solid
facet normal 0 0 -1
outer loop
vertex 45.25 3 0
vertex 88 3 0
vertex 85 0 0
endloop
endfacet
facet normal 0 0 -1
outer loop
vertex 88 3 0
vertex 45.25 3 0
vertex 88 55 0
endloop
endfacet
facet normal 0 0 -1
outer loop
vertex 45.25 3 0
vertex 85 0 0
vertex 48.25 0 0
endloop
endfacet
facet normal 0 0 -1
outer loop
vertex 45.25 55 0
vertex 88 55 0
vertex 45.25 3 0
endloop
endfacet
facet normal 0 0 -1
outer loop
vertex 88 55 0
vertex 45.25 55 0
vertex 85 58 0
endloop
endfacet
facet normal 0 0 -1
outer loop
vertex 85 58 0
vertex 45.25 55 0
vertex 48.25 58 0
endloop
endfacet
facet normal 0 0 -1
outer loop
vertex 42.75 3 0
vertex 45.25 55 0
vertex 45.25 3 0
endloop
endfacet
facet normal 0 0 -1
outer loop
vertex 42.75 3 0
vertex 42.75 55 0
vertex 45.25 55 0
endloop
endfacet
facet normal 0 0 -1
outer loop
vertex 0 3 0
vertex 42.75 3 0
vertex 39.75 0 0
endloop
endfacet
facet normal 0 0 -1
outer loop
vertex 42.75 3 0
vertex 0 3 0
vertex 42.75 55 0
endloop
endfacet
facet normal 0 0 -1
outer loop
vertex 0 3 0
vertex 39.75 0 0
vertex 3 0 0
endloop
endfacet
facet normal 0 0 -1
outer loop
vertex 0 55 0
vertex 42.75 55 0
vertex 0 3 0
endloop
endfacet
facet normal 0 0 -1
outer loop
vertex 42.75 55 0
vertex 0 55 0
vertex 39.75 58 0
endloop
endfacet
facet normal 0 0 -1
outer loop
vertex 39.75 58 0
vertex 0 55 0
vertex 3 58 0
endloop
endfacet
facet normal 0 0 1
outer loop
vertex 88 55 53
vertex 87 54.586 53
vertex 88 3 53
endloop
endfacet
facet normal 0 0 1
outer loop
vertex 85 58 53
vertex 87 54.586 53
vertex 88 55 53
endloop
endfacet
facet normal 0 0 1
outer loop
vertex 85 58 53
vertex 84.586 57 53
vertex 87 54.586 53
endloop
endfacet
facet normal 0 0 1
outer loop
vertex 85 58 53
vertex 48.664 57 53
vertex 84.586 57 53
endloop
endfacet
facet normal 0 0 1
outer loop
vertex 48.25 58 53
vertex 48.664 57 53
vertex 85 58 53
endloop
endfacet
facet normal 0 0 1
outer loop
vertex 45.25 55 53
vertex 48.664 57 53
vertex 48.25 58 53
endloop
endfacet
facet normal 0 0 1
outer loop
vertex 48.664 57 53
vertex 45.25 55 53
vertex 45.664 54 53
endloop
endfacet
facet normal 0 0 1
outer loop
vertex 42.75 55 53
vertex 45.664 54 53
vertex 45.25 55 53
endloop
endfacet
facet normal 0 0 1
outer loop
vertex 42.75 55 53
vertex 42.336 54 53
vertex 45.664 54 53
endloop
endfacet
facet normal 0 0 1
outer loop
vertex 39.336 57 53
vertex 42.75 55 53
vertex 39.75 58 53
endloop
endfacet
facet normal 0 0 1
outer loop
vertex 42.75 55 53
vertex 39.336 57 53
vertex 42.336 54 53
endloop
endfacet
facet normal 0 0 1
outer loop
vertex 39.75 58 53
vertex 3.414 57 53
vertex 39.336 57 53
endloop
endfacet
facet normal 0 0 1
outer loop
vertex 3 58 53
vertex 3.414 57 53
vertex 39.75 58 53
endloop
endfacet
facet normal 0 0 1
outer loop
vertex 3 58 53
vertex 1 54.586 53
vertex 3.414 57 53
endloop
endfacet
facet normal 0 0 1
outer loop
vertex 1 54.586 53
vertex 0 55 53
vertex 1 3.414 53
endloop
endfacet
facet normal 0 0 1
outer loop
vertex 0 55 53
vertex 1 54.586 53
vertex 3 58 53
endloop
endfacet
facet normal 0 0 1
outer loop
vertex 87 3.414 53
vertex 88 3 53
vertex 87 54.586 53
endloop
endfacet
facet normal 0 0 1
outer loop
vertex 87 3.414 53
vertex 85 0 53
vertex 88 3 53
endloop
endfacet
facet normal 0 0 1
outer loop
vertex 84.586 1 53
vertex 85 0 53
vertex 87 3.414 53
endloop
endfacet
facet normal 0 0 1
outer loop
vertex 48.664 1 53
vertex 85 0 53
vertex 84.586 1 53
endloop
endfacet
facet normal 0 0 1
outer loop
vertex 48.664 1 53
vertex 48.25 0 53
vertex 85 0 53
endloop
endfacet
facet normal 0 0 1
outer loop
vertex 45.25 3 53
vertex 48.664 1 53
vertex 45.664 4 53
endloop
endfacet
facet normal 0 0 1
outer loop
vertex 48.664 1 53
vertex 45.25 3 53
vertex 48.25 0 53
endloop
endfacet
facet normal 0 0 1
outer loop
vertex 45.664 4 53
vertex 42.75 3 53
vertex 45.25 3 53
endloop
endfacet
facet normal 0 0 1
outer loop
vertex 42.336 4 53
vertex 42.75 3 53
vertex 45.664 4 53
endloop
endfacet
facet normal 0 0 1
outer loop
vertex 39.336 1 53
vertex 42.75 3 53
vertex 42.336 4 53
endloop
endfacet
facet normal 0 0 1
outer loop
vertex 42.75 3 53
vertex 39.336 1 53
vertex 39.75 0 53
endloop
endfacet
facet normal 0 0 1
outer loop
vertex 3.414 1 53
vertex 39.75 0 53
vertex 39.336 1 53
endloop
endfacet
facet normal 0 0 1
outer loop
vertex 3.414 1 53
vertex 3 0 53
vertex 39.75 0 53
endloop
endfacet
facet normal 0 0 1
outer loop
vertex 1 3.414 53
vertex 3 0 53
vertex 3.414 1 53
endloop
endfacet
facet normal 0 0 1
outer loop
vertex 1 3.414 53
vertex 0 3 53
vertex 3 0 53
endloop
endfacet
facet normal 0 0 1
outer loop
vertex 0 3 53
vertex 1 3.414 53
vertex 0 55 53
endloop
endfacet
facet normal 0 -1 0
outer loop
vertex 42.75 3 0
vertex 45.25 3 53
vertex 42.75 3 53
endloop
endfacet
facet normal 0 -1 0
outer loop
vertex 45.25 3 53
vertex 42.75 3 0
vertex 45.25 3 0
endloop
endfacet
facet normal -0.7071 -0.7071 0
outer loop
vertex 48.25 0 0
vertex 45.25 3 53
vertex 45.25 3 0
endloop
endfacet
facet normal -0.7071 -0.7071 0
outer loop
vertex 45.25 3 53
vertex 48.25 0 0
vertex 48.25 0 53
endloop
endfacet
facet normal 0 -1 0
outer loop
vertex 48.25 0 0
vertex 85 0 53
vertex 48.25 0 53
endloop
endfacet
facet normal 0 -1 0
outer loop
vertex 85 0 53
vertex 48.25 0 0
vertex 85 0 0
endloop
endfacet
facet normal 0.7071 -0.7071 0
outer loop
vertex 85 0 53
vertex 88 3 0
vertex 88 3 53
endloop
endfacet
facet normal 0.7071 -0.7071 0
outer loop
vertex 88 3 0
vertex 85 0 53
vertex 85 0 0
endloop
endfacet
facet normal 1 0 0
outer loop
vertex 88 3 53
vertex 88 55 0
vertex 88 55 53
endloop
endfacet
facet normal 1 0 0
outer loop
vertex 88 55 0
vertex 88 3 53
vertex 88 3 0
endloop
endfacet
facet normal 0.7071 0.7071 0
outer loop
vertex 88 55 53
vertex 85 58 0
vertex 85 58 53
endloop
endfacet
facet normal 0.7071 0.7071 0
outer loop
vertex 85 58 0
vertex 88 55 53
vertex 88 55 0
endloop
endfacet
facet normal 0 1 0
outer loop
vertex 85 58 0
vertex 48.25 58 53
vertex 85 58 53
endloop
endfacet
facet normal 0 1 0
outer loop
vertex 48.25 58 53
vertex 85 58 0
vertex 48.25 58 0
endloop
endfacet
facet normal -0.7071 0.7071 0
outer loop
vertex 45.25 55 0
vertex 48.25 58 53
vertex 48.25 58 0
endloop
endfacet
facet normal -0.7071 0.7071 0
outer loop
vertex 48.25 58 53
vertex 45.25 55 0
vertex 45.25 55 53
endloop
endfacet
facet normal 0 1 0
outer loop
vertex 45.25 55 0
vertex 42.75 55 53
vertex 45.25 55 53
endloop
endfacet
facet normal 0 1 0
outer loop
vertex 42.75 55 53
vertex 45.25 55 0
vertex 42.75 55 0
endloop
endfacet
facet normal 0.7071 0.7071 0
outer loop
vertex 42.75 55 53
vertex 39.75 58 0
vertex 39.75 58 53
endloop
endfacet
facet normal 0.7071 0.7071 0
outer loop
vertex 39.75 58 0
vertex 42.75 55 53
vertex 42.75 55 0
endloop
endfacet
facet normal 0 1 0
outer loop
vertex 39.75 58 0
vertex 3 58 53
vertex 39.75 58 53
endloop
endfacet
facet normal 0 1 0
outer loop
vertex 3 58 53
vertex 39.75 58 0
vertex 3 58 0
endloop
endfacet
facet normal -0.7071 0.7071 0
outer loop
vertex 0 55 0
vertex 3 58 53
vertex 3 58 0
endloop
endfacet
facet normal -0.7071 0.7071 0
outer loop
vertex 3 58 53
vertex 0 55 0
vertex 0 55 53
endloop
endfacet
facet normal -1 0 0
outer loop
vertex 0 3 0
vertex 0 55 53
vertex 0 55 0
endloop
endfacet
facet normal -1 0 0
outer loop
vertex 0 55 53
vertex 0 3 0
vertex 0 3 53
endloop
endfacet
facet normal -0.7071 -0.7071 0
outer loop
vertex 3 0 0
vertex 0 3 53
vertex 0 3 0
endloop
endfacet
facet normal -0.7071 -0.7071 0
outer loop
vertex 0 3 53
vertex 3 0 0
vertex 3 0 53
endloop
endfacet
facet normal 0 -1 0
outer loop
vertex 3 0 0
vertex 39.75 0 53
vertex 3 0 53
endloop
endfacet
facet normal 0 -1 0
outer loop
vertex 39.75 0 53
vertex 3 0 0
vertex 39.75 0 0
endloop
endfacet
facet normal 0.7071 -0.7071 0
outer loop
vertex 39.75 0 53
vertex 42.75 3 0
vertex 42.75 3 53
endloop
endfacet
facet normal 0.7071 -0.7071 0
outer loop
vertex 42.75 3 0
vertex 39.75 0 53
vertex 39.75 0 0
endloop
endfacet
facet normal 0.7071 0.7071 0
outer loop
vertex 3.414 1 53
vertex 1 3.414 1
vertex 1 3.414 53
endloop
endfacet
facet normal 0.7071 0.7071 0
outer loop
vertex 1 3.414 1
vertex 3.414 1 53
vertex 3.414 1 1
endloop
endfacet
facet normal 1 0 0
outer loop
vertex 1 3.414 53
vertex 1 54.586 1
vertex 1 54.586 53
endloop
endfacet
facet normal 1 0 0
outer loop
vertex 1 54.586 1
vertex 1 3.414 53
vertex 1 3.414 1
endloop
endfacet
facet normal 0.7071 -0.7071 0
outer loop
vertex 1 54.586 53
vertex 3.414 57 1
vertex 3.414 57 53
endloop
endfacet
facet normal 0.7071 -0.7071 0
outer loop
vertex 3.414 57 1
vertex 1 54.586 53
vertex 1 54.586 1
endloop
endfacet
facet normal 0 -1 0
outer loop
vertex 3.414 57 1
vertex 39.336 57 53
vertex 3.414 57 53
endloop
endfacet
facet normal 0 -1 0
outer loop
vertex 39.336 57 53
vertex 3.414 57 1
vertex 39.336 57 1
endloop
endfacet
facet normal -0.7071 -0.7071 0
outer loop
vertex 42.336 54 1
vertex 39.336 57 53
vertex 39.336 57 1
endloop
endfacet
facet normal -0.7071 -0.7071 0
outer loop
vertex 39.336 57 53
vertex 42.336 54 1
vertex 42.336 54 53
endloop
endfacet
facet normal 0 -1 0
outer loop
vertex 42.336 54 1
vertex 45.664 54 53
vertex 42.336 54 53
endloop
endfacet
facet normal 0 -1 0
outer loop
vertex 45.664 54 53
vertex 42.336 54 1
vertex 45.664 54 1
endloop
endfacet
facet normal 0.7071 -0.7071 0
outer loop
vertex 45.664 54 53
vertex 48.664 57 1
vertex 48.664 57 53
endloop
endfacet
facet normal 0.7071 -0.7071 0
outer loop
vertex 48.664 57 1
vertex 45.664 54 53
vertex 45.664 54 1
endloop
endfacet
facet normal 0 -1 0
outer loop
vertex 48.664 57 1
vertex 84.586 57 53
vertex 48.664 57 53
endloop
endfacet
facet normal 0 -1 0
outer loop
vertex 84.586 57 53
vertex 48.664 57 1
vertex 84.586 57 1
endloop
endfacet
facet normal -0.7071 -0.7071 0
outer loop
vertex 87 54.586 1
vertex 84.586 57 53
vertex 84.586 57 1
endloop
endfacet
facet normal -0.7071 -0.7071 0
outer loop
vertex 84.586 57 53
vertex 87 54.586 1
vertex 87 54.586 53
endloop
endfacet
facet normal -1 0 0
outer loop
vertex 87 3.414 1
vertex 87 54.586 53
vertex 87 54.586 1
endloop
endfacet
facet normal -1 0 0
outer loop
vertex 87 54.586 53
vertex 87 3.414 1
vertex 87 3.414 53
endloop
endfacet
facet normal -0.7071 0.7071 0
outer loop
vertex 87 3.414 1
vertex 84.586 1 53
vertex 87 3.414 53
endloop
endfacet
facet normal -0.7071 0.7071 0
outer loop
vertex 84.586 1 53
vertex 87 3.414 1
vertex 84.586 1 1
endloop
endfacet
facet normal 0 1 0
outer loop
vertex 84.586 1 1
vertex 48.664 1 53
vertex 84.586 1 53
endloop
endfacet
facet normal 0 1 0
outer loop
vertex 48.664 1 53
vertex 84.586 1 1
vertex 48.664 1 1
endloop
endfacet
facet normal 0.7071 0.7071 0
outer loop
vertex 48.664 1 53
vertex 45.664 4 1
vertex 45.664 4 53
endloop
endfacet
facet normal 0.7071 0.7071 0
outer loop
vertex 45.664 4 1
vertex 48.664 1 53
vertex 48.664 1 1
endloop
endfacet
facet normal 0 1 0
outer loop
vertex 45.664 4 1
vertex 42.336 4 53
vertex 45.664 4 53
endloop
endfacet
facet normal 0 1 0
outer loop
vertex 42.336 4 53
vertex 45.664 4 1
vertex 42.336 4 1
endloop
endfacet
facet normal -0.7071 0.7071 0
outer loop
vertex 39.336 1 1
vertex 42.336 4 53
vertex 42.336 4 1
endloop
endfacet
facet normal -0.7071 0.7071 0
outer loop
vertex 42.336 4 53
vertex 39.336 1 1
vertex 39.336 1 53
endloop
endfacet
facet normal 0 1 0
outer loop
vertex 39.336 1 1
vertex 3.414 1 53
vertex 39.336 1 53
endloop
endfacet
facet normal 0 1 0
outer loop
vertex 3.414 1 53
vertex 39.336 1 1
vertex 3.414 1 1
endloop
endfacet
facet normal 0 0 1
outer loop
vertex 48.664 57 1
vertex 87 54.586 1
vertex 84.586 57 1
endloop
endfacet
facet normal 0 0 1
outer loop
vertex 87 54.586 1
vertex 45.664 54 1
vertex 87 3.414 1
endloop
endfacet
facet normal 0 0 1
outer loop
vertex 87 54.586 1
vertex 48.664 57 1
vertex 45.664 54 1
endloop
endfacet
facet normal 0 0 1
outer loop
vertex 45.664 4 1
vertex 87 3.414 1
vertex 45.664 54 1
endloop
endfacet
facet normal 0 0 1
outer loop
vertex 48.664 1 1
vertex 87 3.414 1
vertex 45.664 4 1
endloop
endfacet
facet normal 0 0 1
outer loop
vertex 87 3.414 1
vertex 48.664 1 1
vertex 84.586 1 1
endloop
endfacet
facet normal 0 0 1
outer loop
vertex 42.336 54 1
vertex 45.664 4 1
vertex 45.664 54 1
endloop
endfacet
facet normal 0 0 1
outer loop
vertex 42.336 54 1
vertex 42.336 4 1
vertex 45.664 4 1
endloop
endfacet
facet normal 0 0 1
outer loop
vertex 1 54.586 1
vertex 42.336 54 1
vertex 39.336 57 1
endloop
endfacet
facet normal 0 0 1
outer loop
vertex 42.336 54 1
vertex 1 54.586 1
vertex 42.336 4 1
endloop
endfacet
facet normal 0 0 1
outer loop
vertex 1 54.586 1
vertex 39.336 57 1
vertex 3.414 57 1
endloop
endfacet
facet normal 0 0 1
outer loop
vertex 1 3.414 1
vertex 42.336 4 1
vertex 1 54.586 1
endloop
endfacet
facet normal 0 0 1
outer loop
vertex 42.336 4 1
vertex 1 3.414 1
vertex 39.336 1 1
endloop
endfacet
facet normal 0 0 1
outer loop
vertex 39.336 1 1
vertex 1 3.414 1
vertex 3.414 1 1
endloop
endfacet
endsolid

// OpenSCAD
x = 88;
y = 58;
z = 53;

wall=1;

f = 3;
d = wall/tan(67.5);
fd= f+d;
skip = 2.5;

outer = [
  [f,0],
  [0,f],
  
  [0,y-f],
  [f,y],
  
  [x/2-skip/2-f,y],
  [x/2-skip/2,y-f],
  [x/2+skip/2,y-f],
  [x/2+skip/2+f,y],
  
  [x-f,y],
  [x,y-f],
  
  [x,f],  
  [x-f,0],
  
  [x/2-skip/2-f,0],
  [x/2-skip/2,f],
  [x/2+skip/2,f],
  [x/2+skip/2+f,0],
];
outerN = [0,1,2,3,4,5,6,7,8,9,10,11,12,13,14,15];

inner = [
  [fd,wall],
  [wall,fd],
  
  [wall,y-fd],
  [fd,y-wall],
  
  [x/2-skip/2-fd,y-wall],
  [x/2-skip/2-d,y-f-wall],
  [x/2+skip/2+d,y-f-wall],
  [x/2+skip/2+fd,y-wall],
  
  [x-fd,y-wall],
  [x-wall,y-fd],
  
  [x-wall,fd],  
  [x-fd,wall],
  
  [x/2+skip/2+fd,wall],
  [x/2+skip/2+d,f+wall],
  [x/2-skip/2-d,f+wall],
  [x/2-skip/2-fd,wall],
];
innerN = [16,17,18,19,20,21,22,23,24,25,26,27,28,29,30,31];

all = concat(outer,inner);

linear_extrude(z){
    polygon(
        all,
        [outerN,innerN]
    );    
}

linear_extrude(wall){
    polygon(
        outer
    );    
}
